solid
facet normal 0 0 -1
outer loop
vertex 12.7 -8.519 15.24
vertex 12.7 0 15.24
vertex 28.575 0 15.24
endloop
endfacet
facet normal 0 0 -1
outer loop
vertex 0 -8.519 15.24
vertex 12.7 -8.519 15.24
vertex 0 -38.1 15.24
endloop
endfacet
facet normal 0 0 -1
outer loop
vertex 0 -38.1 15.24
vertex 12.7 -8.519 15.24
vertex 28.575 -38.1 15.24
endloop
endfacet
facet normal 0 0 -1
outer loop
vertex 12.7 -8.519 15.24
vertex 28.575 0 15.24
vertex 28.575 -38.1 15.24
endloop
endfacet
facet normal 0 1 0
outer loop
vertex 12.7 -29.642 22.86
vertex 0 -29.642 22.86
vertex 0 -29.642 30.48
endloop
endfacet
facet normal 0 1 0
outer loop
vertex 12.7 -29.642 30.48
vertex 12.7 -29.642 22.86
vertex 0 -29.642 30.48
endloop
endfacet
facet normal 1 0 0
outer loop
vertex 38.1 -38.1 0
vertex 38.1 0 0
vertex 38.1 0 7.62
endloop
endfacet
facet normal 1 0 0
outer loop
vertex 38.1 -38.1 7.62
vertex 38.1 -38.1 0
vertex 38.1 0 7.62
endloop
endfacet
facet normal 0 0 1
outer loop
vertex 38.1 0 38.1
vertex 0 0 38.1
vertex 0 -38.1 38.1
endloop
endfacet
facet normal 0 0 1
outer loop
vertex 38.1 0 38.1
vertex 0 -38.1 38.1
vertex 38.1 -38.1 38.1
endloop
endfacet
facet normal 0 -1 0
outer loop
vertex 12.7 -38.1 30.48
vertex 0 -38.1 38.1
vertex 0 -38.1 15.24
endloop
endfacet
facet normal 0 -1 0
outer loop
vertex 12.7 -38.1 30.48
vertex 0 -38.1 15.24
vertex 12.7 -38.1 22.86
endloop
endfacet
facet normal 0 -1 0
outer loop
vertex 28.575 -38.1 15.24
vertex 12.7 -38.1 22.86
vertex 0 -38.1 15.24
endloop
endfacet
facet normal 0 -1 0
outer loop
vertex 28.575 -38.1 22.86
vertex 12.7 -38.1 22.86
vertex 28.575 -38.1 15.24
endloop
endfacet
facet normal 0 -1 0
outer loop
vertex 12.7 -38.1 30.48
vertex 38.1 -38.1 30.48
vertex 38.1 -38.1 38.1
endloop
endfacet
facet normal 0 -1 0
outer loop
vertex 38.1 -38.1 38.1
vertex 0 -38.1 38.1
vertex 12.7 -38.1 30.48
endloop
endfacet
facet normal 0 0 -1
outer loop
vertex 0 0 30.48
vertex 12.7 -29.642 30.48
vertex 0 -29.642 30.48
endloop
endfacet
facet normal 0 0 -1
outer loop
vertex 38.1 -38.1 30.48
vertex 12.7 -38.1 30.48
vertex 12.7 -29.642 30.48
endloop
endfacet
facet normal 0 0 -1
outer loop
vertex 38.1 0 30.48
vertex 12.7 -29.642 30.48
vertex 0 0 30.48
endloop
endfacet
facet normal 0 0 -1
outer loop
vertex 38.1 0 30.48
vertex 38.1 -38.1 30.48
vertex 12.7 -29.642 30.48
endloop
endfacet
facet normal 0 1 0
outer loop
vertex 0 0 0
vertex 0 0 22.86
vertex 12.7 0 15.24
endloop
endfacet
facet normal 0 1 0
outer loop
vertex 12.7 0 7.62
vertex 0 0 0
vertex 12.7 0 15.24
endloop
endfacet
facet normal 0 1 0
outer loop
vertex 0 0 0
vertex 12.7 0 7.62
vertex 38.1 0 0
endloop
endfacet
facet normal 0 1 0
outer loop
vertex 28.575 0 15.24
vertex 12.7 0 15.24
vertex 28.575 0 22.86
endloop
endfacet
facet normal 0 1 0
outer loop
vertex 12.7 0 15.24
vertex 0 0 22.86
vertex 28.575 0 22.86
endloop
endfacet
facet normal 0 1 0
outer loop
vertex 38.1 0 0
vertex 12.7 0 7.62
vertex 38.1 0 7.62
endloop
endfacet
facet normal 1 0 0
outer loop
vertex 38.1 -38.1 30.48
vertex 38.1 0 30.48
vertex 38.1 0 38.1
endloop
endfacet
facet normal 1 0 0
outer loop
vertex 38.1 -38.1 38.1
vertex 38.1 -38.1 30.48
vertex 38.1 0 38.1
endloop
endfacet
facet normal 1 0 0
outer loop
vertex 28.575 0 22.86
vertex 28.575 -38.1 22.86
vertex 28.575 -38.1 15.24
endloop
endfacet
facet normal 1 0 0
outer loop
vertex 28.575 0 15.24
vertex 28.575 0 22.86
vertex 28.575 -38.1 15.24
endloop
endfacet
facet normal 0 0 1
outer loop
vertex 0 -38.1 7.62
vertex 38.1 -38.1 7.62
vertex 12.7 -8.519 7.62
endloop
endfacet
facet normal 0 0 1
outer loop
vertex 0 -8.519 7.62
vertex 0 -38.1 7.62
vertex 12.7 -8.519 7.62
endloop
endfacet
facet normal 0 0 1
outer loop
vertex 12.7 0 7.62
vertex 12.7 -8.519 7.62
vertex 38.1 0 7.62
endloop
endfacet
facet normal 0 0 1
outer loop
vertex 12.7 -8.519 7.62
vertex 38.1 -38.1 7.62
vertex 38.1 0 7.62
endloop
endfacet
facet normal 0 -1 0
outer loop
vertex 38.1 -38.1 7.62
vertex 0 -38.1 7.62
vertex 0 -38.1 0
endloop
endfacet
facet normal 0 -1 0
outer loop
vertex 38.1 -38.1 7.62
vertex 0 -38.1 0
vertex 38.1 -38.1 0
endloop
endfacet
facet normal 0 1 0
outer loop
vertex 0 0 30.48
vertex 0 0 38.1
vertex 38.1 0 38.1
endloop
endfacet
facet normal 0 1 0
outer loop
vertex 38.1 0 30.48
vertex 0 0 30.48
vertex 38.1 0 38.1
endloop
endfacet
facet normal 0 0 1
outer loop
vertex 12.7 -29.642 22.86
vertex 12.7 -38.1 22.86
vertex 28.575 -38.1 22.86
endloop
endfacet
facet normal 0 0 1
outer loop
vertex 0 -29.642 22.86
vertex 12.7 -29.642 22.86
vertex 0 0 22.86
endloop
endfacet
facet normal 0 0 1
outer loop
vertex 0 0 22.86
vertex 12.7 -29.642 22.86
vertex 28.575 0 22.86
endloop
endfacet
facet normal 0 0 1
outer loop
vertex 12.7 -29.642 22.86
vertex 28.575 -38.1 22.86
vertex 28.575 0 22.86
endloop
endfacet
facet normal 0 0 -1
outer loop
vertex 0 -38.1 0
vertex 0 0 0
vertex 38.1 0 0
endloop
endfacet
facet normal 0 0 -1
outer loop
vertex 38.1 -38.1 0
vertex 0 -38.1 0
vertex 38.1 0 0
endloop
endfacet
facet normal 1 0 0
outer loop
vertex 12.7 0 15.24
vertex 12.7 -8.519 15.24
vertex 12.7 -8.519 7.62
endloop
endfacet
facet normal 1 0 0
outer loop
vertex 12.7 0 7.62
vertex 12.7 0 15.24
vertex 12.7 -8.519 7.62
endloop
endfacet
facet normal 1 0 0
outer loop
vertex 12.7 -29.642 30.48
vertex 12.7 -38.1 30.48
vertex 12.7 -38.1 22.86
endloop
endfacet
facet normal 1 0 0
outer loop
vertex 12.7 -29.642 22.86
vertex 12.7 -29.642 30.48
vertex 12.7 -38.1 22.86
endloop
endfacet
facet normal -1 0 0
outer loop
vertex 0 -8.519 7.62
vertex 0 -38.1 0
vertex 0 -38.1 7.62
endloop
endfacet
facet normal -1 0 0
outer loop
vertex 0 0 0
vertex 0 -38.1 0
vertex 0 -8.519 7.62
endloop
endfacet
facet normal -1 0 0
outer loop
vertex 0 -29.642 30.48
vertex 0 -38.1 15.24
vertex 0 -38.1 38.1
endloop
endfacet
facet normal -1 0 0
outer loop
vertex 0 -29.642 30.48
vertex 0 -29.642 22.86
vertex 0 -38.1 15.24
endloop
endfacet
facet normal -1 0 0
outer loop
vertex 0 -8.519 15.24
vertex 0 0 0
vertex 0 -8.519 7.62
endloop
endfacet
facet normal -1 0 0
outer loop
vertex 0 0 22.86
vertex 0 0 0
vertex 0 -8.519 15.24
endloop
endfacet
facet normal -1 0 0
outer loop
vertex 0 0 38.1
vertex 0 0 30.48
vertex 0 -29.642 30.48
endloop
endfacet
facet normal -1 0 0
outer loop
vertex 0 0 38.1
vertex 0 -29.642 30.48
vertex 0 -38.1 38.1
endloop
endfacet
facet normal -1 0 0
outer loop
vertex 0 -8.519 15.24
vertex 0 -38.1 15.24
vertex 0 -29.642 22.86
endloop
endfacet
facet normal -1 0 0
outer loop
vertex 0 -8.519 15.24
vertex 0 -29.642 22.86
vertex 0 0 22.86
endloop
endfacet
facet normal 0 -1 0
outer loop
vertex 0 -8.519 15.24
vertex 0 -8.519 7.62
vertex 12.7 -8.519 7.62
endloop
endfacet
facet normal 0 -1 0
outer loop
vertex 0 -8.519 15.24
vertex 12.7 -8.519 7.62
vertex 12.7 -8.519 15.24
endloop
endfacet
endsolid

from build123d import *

# Parameters (mm, degrees)
F0_W     = 38.1
F0_H     = 38.1
F1_DEPTH = 38.1
F5_W     = 29.6418
F5_H     = 7.62
F6_DEPTH = 38.1
F8_DEPTH = 38.1


with BuildPart() as f1:
    # F0 (on Front) → F1 (new body)
    with BuildSketch(Plane.XZ):
        with Locations((19.05, 19.05)):
            Rectangle(F0_W, F0_H)
    extrude(amount=F1_DEPTH)

    # F5 (on offset) → F6 (cut)
    with BuildSketch(Plane.YZ.offset(38.1)):
        with Locations((-14.8209, 26.67)):
            Rectangle(F5_W, F5_H)
        Polygon((-8.519419, 15.24), (-38.160126, 15.24), (-38.493167, 7.62), (-8.519419, 7.62), align=None)
    extrude(amount=-F6_DEPTH, mode=Mode.SUBTRACT)

    # F7 (on offset) → F8 (cut)
    with BuildSketch(Plane.XZ.offset(38.1)):
        Polygon((38.1, 7.62), (38.1, 30.48), (12.7, 30.48), (12.7, 22.86), (28.575, 22.86), (28.575, 15.24), (12.7, 15.24), (12.7, 7.62), align=None)
    extrude(amount=-F8_DEPTH, mode=Mode.SUBTRACT)


solid = f1.part
